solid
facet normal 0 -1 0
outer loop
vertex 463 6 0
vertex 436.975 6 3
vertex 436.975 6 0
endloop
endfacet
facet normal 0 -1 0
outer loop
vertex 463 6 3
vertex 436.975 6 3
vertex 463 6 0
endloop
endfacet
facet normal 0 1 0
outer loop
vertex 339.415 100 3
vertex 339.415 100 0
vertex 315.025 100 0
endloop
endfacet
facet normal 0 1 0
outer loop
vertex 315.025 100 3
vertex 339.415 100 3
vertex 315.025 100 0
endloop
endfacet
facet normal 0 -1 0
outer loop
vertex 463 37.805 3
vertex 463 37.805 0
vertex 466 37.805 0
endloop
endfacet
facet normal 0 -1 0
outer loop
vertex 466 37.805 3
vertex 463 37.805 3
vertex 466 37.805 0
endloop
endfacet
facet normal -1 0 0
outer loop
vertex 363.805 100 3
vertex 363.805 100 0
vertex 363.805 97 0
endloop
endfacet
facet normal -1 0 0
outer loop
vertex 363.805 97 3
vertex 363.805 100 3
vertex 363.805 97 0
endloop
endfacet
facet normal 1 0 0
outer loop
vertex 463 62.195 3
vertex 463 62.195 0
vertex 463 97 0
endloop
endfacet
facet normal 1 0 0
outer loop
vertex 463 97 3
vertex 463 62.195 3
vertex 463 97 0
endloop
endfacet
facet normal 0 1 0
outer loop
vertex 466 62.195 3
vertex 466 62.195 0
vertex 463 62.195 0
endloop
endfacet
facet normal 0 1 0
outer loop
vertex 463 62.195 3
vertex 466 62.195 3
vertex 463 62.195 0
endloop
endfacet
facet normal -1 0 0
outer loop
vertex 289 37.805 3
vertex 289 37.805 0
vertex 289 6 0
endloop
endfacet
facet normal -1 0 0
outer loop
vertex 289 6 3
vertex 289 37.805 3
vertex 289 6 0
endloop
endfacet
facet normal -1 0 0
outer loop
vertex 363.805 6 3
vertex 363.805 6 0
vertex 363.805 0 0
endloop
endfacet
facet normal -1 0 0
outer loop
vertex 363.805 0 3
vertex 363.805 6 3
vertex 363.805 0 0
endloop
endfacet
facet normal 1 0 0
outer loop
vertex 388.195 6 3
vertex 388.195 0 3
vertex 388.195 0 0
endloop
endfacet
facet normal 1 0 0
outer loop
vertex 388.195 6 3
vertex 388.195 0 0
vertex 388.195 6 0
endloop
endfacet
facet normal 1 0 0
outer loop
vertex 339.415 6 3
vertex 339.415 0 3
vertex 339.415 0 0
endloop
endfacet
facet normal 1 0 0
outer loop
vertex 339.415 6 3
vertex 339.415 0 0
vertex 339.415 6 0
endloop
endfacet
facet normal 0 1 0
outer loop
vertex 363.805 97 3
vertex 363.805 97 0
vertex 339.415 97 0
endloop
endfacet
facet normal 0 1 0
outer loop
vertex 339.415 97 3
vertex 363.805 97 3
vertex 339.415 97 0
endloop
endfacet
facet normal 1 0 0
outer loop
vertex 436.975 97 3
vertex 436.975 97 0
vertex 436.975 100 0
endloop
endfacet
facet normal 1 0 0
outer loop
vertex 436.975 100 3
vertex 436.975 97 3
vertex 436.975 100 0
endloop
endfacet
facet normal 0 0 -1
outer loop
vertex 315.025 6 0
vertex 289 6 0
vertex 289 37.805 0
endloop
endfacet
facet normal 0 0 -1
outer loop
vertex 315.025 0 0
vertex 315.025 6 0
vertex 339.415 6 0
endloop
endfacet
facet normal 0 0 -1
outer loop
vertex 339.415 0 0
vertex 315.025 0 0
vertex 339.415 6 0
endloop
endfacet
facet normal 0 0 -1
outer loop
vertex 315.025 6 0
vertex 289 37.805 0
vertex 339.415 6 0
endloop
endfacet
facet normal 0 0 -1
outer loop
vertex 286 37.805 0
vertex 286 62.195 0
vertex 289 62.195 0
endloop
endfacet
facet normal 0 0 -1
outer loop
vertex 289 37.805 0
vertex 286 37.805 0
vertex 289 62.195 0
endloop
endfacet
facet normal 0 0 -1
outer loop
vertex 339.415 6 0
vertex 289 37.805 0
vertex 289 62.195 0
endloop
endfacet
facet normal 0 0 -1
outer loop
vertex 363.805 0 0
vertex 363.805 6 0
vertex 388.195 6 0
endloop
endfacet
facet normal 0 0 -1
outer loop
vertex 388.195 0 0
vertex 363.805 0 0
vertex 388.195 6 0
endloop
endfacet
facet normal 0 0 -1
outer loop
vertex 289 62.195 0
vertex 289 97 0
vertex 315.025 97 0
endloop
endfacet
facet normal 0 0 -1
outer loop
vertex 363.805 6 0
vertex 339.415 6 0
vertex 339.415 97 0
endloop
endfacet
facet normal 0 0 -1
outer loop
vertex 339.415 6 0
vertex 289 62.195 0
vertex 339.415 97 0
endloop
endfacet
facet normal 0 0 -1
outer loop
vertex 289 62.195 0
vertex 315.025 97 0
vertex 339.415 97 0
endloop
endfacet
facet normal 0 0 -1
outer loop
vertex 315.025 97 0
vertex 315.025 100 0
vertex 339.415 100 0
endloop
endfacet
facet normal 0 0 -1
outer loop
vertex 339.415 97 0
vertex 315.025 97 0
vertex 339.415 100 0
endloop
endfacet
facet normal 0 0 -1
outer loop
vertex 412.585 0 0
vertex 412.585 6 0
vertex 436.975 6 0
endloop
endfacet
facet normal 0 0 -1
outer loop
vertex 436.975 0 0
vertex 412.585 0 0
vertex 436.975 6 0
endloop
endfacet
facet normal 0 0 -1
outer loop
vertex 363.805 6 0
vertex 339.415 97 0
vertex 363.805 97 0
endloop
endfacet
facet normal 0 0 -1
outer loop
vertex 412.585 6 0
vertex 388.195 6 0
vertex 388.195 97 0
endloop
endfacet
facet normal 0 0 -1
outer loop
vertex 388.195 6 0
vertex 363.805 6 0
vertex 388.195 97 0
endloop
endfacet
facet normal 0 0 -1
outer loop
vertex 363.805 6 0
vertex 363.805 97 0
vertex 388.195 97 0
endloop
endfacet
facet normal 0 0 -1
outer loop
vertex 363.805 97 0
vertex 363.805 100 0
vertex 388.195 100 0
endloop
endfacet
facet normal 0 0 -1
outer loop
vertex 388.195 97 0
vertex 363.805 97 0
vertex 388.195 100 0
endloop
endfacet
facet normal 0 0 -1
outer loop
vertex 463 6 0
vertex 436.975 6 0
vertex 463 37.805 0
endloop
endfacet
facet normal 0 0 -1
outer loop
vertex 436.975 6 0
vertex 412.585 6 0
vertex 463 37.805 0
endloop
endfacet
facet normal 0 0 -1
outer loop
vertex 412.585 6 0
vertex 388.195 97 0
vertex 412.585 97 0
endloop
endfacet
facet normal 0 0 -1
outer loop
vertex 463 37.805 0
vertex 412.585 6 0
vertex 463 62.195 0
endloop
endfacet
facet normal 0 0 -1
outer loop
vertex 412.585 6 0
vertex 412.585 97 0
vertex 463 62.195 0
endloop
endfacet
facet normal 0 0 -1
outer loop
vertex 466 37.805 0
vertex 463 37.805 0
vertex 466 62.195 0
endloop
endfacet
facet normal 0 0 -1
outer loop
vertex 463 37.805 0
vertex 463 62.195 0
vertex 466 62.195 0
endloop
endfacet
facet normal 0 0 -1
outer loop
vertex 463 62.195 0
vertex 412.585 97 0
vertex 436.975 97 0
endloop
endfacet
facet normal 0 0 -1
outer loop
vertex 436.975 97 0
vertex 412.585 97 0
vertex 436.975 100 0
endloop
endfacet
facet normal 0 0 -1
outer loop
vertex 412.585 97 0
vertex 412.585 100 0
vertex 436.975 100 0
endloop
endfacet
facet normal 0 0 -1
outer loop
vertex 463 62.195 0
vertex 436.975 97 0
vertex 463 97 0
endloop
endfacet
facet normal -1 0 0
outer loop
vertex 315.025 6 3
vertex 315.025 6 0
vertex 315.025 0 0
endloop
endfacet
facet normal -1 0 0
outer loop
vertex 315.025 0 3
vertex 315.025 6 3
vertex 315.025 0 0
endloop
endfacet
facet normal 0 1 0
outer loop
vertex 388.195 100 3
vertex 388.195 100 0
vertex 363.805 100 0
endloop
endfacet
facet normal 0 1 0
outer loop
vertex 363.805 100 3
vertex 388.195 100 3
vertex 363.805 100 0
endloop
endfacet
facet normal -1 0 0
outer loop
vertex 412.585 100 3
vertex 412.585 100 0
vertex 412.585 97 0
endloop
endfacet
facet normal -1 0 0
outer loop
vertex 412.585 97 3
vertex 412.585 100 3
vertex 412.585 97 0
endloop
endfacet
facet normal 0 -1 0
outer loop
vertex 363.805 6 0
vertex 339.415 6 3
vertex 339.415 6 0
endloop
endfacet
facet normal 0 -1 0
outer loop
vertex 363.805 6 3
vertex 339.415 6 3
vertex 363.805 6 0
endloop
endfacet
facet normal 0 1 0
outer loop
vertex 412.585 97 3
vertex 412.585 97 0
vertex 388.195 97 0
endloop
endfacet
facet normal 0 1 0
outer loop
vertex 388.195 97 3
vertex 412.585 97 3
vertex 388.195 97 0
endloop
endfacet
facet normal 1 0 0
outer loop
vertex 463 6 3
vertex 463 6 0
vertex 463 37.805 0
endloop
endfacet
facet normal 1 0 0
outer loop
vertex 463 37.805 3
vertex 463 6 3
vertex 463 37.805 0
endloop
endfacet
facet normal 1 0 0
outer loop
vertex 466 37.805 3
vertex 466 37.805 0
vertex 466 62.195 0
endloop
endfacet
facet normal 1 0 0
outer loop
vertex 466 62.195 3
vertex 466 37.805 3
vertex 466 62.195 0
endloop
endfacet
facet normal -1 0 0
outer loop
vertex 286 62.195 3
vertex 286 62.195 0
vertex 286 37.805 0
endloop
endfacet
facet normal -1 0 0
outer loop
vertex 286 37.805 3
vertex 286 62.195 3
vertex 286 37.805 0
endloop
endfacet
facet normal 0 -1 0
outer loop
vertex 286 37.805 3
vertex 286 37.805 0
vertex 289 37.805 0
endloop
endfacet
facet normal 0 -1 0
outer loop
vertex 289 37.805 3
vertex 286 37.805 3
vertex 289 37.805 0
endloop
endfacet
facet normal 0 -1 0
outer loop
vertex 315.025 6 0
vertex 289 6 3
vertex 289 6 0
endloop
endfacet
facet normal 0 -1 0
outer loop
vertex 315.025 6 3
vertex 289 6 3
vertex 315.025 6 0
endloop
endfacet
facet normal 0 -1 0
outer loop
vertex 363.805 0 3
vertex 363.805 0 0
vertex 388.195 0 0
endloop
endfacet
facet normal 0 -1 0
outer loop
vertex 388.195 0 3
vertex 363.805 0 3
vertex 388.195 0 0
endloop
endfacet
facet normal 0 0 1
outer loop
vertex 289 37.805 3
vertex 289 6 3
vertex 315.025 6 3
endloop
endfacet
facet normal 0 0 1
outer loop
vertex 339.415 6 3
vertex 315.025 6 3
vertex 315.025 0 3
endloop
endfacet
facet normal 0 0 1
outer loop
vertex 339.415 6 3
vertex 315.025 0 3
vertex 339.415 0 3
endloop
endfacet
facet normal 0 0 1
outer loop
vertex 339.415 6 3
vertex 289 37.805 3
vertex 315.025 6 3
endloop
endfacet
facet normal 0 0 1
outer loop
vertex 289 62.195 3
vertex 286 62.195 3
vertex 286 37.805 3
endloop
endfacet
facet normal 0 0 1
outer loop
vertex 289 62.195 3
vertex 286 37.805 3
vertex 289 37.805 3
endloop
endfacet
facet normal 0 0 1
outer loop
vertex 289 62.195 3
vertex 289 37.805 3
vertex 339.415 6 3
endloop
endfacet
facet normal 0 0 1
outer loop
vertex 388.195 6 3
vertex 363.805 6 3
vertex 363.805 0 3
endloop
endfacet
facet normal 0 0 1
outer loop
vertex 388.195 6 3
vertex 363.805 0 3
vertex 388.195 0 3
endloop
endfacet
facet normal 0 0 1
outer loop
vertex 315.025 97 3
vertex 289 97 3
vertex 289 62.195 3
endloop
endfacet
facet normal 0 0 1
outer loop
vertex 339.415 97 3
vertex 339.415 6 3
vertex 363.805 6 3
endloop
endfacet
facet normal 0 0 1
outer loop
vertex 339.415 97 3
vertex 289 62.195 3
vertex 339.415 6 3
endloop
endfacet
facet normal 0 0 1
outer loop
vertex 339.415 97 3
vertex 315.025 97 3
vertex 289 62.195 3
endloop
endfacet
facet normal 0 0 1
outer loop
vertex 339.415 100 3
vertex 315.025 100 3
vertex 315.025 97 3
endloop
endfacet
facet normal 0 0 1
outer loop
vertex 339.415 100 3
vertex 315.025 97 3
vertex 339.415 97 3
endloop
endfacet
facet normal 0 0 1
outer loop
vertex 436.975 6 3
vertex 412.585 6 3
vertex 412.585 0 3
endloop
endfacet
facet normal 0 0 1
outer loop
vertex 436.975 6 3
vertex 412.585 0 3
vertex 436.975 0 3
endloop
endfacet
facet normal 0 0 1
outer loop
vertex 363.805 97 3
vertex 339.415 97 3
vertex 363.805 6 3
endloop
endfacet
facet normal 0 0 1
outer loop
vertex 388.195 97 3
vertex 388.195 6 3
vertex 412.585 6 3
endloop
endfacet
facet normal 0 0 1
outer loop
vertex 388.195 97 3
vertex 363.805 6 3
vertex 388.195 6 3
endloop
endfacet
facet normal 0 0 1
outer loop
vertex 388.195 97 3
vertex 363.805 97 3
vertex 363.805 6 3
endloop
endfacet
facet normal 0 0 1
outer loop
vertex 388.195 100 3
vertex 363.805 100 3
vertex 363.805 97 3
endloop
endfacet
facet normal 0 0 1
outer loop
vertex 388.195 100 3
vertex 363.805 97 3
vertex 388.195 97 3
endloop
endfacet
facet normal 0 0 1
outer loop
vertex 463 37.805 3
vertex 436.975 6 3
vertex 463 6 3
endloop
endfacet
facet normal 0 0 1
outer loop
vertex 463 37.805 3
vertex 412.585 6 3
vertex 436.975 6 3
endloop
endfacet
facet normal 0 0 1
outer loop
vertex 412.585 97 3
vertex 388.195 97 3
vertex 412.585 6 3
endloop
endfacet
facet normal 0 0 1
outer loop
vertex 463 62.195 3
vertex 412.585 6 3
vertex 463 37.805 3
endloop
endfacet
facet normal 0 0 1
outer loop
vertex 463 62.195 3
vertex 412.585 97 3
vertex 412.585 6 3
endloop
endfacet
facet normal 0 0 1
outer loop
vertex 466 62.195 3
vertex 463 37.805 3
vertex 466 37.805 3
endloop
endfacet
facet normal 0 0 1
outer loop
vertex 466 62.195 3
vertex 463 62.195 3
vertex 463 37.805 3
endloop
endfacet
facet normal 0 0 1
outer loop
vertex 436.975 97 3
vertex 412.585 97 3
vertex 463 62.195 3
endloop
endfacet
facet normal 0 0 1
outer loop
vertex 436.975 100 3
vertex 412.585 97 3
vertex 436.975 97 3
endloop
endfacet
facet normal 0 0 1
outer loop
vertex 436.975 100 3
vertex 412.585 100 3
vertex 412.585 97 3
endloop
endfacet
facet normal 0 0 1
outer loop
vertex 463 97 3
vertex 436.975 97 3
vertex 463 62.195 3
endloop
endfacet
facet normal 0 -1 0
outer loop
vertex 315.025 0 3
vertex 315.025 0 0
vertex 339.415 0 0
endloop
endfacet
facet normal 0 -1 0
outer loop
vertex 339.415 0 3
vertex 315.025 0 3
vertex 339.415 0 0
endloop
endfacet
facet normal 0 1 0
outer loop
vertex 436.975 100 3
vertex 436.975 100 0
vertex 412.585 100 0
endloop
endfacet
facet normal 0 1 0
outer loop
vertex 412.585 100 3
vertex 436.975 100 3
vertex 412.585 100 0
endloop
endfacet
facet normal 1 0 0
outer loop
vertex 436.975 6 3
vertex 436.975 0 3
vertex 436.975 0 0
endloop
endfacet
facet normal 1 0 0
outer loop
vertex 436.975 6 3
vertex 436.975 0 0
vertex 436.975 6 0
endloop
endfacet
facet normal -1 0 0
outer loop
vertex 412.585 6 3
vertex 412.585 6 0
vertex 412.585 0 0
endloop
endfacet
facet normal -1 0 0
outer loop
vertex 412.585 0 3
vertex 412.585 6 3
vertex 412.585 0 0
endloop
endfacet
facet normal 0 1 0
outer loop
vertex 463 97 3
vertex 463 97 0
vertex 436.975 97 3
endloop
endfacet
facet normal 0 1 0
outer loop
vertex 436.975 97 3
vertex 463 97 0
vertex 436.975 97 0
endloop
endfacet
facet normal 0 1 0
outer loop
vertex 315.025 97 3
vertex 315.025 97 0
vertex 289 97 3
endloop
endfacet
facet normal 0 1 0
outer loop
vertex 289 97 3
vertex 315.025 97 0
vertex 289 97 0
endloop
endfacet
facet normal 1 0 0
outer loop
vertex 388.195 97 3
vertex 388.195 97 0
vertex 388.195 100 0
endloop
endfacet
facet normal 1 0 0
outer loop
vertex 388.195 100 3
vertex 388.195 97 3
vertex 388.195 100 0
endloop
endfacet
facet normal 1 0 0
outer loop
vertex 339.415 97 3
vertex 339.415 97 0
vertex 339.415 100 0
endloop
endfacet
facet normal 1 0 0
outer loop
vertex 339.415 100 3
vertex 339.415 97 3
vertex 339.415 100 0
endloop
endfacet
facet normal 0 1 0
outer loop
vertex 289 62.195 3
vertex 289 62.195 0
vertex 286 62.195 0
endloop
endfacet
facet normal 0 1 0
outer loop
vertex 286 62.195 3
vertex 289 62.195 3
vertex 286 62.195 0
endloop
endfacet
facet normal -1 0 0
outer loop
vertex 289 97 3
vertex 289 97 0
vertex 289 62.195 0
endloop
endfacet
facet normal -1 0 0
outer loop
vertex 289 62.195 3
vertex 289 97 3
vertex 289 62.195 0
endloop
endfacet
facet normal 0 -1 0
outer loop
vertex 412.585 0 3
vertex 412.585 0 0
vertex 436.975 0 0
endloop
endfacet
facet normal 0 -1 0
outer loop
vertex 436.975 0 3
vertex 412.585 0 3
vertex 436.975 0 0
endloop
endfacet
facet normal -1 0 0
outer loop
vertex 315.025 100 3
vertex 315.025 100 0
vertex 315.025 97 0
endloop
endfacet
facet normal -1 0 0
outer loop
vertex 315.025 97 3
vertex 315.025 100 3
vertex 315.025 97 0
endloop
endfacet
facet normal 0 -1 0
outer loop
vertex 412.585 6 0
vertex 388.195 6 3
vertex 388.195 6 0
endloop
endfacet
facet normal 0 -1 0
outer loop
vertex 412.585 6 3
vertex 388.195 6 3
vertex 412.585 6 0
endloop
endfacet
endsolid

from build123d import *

# Parameters (mm, degrees)
SALIENTE_EXTRUIR1_DEPTH = 3
CROQUIS1_W              = 26.025
CROQUIS1_H              = 3
CROQUIS1_W_2            = 24.39
CORTAR_EXTRUIR1_DEPTH   = 3


with BuildPart() as part:
    # Model → Saliente-Extruir1 (new body)
    with BuildSketch(Plane.XY):
        Polygon((289, 97), (289, 62.195), (286, 62.195), (286, 37.805), (289, 37.805), (289, 13.415), (289, 3), (315.025, 3), (315.025, 0), (339.415, 0), (339.415, 3), (363.805, 3), (363.805, 0), (388.195, 0), (388.195, 3), (412.585, 3), (412.585, 0), (436.975, 0), (436.975, 3), (461.365, 3), (463, 3), (463, 37.805), (466, 37.805), (466, 62.195), (463, 62.195), (463, 86.585), (463, 97), (436.975, 97), (436.975, 100), (412.585, 100), (412.585, 97), (388.195, 97), (388.195, 100), (363.805, 100), (363.805, 97), (339.415, 97), (339.415, 100), (315.025, 100), (315.025, 97), (290.635, 97), align=None)
    extrude(amount=SALIENTE_EXTRUIR1_DEPTH)

    # Croquis1 → Cortar-Extruir1 (cut)
    with BuildSketch(Plane.XY.offset(3)):
        with Locations((302.0125, 4.5)):
            Rectangle(CROQUIS1_W, CROQUIS1_H)
        with Locations((351.61, 4.5)):
            Rectangle(CROQUIS1_W_2, CROQUIS1_H)
        with Locations((400.39, 4.5)):
            Rectangle(CROQUIS1_W_2, CROQUIS1_H)
        with Locations((449.9875, 4.5)):
            Rectangle(CROQUIS1_W, CROQUIS1_H)
    extrude(amount=-CORTAR_EXTRUIR1_DEPTH, mode=Mode.SUBTRACT)


solid = part.part
